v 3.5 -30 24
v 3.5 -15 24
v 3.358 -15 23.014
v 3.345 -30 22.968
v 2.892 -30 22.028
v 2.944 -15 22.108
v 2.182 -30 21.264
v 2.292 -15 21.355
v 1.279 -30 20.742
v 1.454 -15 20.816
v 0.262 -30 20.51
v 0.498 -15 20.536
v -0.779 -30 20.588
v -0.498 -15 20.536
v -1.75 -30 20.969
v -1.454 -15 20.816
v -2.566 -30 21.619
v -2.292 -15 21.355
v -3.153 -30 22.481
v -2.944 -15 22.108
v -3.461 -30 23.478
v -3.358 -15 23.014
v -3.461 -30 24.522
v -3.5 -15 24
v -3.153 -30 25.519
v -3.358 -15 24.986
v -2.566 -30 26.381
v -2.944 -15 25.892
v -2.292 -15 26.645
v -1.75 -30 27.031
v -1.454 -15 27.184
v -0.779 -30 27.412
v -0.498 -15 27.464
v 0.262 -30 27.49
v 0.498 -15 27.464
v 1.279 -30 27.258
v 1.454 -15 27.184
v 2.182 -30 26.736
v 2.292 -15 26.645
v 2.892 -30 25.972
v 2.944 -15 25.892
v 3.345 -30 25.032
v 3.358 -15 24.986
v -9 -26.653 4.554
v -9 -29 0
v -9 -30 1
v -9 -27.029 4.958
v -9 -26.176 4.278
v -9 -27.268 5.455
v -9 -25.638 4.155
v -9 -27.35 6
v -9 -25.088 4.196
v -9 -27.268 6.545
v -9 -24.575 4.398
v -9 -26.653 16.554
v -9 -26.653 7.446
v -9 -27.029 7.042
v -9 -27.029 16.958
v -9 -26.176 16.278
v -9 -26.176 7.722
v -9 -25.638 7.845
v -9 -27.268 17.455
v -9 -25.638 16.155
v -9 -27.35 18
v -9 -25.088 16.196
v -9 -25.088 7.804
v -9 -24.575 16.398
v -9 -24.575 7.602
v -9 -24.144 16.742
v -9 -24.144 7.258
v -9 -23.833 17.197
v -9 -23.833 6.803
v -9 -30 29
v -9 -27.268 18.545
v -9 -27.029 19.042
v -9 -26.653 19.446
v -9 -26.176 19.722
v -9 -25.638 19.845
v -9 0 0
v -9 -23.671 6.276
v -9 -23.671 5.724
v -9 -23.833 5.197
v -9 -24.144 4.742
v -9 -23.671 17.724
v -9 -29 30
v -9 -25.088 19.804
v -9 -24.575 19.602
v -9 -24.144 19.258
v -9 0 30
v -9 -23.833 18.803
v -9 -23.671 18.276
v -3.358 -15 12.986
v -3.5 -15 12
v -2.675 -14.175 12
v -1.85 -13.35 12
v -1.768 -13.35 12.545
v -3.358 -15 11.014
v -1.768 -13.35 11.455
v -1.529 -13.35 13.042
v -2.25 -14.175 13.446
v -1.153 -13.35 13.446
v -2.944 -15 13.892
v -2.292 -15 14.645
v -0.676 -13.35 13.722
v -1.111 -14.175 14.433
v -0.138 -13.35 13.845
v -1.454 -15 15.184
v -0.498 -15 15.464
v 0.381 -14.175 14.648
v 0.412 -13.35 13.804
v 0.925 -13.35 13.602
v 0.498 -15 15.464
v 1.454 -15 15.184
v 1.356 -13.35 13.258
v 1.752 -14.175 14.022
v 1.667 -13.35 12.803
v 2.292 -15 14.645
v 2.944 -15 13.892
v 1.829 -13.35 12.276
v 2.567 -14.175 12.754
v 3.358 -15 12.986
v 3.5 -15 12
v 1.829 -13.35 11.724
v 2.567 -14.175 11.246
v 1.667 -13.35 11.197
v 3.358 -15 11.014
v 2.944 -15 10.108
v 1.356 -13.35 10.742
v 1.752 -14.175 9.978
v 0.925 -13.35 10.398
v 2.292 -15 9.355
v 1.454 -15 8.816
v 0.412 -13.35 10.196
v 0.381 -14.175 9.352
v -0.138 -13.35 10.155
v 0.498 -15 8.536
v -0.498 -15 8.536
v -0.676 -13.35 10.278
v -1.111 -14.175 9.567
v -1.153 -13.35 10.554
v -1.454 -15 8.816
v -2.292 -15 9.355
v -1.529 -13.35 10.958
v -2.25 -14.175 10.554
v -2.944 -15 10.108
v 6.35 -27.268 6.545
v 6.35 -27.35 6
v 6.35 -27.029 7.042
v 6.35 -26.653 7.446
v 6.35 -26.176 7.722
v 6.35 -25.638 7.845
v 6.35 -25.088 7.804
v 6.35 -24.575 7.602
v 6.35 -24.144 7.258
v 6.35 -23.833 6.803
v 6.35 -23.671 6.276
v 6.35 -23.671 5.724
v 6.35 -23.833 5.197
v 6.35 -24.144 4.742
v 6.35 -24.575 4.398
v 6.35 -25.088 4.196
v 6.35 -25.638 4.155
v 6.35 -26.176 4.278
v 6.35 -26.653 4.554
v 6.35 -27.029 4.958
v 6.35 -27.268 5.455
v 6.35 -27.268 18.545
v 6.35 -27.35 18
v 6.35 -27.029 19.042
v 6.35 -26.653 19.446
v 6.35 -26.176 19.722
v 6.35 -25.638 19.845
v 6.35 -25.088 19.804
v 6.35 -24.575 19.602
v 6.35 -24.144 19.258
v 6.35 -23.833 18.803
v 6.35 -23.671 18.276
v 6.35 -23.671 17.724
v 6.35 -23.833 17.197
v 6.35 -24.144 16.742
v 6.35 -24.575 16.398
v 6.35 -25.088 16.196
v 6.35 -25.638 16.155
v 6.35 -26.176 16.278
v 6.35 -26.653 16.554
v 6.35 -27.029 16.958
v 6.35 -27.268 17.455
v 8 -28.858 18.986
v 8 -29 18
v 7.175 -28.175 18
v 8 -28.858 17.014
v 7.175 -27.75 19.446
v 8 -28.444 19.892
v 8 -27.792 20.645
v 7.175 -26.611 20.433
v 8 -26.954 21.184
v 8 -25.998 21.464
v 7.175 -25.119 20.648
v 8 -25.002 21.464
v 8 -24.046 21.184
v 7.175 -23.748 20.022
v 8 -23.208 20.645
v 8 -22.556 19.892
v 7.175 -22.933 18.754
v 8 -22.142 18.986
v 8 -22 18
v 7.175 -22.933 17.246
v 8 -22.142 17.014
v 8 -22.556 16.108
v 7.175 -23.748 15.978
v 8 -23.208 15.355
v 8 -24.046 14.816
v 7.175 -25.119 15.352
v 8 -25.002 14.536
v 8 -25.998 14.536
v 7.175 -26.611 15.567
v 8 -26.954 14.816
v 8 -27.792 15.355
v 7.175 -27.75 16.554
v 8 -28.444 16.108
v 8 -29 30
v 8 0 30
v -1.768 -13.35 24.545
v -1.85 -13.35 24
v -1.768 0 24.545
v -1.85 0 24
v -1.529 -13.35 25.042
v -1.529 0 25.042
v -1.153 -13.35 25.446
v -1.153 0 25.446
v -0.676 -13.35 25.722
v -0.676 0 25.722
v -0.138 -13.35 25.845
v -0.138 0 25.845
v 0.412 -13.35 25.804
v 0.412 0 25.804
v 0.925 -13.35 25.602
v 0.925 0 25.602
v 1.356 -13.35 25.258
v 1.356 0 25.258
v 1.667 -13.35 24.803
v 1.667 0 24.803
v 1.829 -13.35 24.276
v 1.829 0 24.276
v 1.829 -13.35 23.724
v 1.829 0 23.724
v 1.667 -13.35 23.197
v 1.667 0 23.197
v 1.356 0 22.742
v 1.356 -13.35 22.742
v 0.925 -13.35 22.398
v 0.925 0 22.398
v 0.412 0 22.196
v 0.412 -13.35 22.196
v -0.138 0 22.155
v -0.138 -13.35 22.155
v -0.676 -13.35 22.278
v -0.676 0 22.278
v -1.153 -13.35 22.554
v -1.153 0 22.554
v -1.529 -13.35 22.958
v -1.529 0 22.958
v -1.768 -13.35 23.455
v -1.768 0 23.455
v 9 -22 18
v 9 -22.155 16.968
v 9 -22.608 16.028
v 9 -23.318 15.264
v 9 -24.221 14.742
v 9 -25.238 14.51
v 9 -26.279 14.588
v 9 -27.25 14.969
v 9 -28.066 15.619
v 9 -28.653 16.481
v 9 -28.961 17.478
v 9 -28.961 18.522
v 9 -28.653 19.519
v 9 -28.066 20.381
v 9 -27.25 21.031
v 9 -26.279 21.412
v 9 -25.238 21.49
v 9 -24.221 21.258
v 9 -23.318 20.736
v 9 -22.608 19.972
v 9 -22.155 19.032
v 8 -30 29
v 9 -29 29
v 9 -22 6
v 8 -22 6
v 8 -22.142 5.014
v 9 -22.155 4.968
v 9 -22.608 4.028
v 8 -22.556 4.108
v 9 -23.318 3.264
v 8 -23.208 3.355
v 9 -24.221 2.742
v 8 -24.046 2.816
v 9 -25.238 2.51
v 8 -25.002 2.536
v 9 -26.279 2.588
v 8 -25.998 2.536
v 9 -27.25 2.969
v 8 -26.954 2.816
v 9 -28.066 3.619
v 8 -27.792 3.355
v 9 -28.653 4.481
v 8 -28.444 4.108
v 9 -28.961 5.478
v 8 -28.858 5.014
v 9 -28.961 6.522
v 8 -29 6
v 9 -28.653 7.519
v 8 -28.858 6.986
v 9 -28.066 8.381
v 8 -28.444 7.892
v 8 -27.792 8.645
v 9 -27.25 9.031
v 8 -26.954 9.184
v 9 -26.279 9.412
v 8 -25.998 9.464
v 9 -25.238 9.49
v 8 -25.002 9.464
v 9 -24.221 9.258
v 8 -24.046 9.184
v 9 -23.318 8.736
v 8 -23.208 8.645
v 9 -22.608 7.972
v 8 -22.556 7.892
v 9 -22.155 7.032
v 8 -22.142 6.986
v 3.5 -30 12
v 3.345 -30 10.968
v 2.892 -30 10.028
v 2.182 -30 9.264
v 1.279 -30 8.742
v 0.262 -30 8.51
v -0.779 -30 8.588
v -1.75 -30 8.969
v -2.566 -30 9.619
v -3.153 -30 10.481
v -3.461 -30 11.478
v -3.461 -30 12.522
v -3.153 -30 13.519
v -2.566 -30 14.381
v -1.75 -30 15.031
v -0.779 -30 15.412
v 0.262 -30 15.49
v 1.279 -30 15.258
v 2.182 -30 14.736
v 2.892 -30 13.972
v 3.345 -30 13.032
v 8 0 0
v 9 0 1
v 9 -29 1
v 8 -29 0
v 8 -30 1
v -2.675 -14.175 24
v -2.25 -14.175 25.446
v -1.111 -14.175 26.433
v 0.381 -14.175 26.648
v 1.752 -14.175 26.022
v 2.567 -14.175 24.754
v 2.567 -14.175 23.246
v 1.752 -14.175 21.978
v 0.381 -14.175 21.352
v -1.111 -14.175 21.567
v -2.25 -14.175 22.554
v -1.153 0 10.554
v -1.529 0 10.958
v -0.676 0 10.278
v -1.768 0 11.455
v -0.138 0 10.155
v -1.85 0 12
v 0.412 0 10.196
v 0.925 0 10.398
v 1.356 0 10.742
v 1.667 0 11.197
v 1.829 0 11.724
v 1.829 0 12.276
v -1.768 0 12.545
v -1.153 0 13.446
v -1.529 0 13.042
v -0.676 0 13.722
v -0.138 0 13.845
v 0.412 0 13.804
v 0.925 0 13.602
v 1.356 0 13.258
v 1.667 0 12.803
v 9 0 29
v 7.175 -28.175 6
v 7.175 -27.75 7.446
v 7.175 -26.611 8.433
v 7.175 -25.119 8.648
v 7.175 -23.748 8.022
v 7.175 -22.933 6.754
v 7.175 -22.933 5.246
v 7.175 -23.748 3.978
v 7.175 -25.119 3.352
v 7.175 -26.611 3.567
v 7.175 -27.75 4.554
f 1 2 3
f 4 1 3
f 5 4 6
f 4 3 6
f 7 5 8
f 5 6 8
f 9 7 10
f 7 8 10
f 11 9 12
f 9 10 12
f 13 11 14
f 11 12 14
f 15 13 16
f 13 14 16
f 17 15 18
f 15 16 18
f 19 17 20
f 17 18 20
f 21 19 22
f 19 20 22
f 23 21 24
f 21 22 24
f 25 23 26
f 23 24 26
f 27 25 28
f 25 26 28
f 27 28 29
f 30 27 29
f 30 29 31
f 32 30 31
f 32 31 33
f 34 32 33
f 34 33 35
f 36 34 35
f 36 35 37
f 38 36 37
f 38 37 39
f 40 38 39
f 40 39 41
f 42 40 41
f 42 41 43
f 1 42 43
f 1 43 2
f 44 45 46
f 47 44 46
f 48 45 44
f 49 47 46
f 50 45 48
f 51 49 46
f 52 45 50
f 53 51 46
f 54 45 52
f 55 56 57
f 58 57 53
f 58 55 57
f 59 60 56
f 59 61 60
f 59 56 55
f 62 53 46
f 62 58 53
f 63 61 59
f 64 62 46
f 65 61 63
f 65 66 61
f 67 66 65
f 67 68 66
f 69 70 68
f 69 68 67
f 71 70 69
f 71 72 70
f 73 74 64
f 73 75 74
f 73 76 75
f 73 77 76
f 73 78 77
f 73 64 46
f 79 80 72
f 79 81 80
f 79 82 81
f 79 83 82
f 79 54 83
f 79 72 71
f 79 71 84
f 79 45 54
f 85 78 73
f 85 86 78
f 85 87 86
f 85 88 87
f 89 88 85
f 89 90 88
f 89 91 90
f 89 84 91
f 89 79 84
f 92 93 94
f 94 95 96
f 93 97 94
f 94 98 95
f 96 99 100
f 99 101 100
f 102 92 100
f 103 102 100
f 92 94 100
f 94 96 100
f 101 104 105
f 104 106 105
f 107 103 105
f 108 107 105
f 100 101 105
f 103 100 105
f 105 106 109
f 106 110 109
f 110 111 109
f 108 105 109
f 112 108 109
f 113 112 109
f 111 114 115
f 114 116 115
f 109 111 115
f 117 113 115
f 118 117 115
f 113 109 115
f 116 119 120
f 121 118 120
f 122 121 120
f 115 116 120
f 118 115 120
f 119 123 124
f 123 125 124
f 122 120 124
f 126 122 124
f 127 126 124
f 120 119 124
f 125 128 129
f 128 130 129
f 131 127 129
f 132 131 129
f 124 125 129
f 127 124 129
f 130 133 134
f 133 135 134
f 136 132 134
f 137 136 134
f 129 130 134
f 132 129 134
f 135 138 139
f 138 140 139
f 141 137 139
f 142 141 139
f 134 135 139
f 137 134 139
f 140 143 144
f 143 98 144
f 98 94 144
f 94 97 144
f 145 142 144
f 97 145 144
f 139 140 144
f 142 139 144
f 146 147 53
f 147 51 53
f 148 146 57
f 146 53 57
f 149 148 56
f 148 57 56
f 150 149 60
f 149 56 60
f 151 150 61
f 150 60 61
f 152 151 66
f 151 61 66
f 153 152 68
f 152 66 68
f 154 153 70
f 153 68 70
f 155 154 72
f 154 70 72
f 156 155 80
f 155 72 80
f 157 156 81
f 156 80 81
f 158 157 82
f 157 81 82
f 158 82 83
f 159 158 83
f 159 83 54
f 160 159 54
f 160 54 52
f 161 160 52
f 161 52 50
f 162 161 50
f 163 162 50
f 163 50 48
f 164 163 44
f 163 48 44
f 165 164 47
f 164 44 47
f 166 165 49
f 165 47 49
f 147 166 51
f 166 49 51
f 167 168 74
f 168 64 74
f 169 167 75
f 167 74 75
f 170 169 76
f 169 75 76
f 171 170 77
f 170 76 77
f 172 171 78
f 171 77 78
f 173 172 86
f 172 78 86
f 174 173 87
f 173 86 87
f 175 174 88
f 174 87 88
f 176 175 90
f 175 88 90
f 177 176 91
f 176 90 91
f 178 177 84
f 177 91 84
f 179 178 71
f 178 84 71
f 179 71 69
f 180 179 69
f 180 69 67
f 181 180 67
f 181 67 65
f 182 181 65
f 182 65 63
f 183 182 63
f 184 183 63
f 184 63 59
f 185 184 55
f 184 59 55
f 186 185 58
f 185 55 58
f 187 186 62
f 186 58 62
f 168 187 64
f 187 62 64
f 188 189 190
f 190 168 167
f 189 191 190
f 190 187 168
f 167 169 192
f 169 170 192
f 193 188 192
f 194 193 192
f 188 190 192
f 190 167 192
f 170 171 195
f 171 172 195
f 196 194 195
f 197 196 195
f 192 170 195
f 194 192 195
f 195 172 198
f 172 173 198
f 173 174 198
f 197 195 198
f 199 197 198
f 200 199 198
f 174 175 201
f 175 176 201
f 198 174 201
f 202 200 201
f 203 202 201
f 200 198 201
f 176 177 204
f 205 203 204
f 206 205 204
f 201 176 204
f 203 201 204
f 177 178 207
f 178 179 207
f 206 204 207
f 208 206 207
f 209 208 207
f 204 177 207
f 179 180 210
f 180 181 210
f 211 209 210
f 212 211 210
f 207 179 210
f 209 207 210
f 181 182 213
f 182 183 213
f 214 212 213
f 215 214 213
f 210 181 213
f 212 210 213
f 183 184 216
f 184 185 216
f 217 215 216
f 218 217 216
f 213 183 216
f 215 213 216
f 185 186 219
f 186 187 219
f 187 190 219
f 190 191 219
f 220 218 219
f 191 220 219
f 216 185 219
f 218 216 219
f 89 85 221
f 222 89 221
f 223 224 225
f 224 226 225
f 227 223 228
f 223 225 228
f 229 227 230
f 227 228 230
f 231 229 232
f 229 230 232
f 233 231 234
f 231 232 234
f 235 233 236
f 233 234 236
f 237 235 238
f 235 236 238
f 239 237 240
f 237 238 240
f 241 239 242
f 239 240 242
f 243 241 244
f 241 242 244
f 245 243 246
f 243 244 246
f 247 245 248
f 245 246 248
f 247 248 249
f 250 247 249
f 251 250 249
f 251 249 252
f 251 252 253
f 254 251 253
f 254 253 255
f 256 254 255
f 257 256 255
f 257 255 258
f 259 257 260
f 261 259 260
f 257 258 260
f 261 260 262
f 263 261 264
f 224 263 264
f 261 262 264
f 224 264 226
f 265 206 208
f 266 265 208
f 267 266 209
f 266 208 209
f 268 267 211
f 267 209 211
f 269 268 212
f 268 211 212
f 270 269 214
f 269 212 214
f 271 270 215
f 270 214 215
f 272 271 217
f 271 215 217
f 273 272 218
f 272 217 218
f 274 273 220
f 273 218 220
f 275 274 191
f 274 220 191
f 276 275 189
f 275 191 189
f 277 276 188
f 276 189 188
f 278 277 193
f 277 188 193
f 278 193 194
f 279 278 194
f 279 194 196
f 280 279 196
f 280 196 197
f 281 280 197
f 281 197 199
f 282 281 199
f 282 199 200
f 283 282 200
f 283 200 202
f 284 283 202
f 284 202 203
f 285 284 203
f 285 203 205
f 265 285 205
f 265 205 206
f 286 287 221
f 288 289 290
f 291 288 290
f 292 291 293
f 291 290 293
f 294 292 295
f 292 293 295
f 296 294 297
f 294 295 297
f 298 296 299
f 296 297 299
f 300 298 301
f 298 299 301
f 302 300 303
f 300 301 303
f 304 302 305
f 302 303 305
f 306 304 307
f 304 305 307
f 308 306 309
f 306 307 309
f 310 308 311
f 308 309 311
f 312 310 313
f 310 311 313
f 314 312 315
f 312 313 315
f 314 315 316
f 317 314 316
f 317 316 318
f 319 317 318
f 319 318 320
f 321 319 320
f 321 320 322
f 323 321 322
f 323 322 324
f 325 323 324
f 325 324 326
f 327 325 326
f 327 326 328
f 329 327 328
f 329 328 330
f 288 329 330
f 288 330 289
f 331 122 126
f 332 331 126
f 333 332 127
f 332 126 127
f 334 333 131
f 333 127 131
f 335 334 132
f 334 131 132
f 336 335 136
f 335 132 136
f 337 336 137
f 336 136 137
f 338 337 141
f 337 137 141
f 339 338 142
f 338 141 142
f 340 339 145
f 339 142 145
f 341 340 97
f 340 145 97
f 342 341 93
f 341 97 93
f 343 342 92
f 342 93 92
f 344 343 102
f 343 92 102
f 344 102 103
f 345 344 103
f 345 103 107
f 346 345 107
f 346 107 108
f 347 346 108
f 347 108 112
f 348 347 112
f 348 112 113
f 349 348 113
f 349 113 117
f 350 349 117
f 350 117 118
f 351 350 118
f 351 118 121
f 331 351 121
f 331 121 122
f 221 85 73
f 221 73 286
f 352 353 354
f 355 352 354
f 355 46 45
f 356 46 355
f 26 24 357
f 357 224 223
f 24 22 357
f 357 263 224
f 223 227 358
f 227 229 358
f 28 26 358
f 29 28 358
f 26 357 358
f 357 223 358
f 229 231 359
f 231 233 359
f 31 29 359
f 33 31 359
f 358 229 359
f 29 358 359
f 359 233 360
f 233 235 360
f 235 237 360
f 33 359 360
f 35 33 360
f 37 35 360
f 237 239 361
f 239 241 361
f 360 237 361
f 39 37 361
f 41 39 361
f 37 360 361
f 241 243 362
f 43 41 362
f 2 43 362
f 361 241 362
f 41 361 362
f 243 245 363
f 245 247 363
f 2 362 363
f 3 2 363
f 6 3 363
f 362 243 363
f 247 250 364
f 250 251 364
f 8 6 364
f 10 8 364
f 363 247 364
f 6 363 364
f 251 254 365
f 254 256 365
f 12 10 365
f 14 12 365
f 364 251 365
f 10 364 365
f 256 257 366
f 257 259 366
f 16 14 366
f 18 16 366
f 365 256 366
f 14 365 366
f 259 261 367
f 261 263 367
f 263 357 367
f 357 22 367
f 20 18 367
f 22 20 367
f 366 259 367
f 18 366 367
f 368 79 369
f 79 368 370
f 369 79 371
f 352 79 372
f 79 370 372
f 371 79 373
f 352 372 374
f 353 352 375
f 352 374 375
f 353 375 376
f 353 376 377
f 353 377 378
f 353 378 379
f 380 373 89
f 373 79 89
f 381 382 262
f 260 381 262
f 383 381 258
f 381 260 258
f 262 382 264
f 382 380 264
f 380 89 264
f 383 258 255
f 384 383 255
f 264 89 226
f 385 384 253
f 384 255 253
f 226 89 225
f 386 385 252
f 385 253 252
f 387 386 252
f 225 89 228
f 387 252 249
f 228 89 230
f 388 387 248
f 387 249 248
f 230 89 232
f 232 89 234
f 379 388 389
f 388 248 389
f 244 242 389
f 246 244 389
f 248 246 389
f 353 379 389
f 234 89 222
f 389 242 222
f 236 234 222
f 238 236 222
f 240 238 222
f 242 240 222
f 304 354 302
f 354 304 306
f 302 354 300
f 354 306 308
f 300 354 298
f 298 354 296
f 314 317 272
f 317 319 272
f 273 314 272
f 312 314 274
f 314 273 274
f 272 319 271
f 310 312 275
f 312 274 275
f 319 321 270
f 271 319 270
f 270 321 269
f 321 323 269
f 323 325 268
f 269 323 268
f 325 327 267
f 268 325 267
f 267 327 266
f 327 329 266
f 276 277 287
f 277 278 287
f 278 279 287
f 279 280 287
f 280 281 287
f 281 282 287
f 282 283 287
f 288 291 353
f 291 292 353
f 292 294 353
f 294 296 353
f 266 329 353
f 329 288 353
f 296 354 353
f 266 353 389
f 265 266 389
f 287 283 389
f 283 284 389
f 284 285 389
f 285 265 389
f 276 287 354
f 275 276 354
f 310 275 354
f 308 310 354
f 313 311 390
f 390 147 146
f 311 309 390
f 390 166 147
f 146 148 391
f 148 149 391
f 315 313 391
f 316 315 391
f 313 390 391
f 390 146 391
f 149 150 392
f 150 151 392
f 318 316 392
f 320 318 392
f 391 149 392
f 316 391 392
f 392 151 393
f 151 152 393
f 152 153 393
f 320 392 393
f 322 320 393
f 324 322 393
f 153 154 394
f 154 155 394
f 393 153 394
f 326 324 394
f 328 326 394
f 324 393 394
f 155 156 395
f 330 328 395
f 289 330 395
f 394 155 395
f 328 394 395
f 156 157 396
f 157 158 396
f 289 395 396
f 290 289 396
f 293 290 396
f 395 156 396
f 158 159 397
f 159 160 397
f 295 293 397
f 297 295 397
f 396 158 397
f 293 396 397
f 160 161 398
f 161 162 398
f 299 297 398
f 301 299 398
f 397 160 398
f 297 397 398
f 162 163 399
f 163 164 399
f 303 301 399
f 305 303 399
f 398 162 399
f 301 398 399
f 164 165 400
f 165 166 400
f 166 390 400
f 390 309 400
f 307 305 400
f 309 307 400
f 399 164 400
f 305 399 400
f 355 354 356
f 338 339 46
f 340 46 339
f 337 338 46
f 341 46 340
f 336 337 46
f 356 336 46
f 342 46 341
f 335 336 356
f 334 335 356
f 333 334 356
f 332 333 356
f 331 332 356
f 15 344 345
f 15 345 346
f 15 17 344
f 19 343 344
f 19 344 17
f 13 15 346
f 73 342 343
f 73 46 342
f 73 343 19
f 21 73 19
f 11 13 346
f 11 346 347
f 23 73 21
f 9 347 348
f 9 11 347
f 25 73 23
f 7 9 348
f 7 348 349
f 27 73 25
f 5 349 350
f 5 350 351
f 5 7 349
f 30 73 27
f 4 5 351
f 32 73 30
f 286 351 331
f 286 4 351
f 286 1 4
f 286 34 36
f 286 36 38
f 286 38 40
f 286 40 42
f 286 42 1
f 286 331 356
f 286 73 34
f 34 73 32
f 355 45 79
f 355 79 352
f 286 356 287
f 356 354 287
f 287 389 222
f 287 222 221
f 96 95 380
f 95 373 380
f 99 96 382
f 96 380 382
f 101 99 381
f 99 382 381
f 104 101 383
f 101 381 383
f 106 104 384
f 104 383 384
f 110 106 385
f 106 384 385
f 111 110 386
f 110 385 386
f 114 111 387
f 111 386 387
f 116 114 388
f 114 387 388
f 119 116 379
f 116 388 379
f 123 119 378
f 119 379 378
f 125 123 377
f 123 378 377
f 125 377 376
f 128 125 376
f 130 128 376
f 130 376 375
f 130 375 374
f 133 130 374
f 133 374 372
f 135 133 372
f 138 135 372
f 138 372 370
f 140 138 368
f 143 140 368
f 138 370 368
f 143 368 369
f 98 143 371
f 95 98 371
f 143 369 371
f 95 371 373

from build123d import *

# Parameters (mm, degrees)
F0_W           = 18
F0_H           = 30
F1_DEPTH       = 30
F4_D           = 7
F4_DEPTH       = 15.001
F5_D           = 3.7
F5_CSINK_D     = 7
F5_CSINK_ANGLE = 90
F8_D           = 7
F8_DEPTH       = 1.001
F9_D           = 3.7
F9_CSINK_D     = 7
F9_CSINK_ANGLE = 90
F10_SIZE       = 0.99999


# Not quite as in the source:
# - a fillet or chamfer is up to 0.001 mm smaller than in the source, because OpenCascade refuses the exact size


with BuildPart() as f1:
    # F0 (on Front) → F1 (new body)
    with BuildSketch(Plane.XZ):
        with Locations((0, 15)):
            Rectangle(F0_W, F0_H)
    extrude(amount=F1_DEPTH)

    # F4 (through all, one way)
    with BuildSketch(Plane(origin=(0, -15, 0), x_dir=(1, 0, 0), z_dir=(0, 1, 0))):
        with Locations((0, -24), (0, -12)):
            Circle(F4_D / 2)
    extrude(amount=-F4_DEPTH, mode=Mode.SUBTRACT)

    # F5 (through all)
    with Locations(Plane.XZ.offset(15)):
        with Locations((0, 24), (0, 12)):
            CounterSinkHole(F5_D / 2, F5_CSINK_D / 2, counter_sink_angle=F5_CSINK_ANGLE)

    # F8 (through all, one way)
    with BuildSketch(Plane(origin=(8, 0, 0), x_dir=(0, 1, 0), z_dir=(-1, 0, 0))):
        with Locations((-25.5, -18), (-25.5, -6)):
            Circle(F8_D / 2)
    extrude(amount=-F8_DEPTH, mode=Mode.SUBTRACT)

    # F9 (through all)
    with Locations(Plane.YZ.offset(8)):
        with Locations((-25.5, 18), (-25.5, 6)):
            CounterSinkHole(F9_D / 2, F9_CSINK_D / 2, counter_sink_angle=F9_CSINK_ANGLE)

    # F10 (size 1 in the source; OpenCascade refuses exactly that, so slightly less here)
    f10_edges = [f1.edges().sort_by_distance(p)[0] for p in [
        (9, -30, 15),
        (9, -15, 30),
        (0, -30, 30),
        (9, -15, 0),
        (0, -30, 0),
    ]]
    chamfer(f10_edges, length=F10_SIZE)


solid = f1.part
